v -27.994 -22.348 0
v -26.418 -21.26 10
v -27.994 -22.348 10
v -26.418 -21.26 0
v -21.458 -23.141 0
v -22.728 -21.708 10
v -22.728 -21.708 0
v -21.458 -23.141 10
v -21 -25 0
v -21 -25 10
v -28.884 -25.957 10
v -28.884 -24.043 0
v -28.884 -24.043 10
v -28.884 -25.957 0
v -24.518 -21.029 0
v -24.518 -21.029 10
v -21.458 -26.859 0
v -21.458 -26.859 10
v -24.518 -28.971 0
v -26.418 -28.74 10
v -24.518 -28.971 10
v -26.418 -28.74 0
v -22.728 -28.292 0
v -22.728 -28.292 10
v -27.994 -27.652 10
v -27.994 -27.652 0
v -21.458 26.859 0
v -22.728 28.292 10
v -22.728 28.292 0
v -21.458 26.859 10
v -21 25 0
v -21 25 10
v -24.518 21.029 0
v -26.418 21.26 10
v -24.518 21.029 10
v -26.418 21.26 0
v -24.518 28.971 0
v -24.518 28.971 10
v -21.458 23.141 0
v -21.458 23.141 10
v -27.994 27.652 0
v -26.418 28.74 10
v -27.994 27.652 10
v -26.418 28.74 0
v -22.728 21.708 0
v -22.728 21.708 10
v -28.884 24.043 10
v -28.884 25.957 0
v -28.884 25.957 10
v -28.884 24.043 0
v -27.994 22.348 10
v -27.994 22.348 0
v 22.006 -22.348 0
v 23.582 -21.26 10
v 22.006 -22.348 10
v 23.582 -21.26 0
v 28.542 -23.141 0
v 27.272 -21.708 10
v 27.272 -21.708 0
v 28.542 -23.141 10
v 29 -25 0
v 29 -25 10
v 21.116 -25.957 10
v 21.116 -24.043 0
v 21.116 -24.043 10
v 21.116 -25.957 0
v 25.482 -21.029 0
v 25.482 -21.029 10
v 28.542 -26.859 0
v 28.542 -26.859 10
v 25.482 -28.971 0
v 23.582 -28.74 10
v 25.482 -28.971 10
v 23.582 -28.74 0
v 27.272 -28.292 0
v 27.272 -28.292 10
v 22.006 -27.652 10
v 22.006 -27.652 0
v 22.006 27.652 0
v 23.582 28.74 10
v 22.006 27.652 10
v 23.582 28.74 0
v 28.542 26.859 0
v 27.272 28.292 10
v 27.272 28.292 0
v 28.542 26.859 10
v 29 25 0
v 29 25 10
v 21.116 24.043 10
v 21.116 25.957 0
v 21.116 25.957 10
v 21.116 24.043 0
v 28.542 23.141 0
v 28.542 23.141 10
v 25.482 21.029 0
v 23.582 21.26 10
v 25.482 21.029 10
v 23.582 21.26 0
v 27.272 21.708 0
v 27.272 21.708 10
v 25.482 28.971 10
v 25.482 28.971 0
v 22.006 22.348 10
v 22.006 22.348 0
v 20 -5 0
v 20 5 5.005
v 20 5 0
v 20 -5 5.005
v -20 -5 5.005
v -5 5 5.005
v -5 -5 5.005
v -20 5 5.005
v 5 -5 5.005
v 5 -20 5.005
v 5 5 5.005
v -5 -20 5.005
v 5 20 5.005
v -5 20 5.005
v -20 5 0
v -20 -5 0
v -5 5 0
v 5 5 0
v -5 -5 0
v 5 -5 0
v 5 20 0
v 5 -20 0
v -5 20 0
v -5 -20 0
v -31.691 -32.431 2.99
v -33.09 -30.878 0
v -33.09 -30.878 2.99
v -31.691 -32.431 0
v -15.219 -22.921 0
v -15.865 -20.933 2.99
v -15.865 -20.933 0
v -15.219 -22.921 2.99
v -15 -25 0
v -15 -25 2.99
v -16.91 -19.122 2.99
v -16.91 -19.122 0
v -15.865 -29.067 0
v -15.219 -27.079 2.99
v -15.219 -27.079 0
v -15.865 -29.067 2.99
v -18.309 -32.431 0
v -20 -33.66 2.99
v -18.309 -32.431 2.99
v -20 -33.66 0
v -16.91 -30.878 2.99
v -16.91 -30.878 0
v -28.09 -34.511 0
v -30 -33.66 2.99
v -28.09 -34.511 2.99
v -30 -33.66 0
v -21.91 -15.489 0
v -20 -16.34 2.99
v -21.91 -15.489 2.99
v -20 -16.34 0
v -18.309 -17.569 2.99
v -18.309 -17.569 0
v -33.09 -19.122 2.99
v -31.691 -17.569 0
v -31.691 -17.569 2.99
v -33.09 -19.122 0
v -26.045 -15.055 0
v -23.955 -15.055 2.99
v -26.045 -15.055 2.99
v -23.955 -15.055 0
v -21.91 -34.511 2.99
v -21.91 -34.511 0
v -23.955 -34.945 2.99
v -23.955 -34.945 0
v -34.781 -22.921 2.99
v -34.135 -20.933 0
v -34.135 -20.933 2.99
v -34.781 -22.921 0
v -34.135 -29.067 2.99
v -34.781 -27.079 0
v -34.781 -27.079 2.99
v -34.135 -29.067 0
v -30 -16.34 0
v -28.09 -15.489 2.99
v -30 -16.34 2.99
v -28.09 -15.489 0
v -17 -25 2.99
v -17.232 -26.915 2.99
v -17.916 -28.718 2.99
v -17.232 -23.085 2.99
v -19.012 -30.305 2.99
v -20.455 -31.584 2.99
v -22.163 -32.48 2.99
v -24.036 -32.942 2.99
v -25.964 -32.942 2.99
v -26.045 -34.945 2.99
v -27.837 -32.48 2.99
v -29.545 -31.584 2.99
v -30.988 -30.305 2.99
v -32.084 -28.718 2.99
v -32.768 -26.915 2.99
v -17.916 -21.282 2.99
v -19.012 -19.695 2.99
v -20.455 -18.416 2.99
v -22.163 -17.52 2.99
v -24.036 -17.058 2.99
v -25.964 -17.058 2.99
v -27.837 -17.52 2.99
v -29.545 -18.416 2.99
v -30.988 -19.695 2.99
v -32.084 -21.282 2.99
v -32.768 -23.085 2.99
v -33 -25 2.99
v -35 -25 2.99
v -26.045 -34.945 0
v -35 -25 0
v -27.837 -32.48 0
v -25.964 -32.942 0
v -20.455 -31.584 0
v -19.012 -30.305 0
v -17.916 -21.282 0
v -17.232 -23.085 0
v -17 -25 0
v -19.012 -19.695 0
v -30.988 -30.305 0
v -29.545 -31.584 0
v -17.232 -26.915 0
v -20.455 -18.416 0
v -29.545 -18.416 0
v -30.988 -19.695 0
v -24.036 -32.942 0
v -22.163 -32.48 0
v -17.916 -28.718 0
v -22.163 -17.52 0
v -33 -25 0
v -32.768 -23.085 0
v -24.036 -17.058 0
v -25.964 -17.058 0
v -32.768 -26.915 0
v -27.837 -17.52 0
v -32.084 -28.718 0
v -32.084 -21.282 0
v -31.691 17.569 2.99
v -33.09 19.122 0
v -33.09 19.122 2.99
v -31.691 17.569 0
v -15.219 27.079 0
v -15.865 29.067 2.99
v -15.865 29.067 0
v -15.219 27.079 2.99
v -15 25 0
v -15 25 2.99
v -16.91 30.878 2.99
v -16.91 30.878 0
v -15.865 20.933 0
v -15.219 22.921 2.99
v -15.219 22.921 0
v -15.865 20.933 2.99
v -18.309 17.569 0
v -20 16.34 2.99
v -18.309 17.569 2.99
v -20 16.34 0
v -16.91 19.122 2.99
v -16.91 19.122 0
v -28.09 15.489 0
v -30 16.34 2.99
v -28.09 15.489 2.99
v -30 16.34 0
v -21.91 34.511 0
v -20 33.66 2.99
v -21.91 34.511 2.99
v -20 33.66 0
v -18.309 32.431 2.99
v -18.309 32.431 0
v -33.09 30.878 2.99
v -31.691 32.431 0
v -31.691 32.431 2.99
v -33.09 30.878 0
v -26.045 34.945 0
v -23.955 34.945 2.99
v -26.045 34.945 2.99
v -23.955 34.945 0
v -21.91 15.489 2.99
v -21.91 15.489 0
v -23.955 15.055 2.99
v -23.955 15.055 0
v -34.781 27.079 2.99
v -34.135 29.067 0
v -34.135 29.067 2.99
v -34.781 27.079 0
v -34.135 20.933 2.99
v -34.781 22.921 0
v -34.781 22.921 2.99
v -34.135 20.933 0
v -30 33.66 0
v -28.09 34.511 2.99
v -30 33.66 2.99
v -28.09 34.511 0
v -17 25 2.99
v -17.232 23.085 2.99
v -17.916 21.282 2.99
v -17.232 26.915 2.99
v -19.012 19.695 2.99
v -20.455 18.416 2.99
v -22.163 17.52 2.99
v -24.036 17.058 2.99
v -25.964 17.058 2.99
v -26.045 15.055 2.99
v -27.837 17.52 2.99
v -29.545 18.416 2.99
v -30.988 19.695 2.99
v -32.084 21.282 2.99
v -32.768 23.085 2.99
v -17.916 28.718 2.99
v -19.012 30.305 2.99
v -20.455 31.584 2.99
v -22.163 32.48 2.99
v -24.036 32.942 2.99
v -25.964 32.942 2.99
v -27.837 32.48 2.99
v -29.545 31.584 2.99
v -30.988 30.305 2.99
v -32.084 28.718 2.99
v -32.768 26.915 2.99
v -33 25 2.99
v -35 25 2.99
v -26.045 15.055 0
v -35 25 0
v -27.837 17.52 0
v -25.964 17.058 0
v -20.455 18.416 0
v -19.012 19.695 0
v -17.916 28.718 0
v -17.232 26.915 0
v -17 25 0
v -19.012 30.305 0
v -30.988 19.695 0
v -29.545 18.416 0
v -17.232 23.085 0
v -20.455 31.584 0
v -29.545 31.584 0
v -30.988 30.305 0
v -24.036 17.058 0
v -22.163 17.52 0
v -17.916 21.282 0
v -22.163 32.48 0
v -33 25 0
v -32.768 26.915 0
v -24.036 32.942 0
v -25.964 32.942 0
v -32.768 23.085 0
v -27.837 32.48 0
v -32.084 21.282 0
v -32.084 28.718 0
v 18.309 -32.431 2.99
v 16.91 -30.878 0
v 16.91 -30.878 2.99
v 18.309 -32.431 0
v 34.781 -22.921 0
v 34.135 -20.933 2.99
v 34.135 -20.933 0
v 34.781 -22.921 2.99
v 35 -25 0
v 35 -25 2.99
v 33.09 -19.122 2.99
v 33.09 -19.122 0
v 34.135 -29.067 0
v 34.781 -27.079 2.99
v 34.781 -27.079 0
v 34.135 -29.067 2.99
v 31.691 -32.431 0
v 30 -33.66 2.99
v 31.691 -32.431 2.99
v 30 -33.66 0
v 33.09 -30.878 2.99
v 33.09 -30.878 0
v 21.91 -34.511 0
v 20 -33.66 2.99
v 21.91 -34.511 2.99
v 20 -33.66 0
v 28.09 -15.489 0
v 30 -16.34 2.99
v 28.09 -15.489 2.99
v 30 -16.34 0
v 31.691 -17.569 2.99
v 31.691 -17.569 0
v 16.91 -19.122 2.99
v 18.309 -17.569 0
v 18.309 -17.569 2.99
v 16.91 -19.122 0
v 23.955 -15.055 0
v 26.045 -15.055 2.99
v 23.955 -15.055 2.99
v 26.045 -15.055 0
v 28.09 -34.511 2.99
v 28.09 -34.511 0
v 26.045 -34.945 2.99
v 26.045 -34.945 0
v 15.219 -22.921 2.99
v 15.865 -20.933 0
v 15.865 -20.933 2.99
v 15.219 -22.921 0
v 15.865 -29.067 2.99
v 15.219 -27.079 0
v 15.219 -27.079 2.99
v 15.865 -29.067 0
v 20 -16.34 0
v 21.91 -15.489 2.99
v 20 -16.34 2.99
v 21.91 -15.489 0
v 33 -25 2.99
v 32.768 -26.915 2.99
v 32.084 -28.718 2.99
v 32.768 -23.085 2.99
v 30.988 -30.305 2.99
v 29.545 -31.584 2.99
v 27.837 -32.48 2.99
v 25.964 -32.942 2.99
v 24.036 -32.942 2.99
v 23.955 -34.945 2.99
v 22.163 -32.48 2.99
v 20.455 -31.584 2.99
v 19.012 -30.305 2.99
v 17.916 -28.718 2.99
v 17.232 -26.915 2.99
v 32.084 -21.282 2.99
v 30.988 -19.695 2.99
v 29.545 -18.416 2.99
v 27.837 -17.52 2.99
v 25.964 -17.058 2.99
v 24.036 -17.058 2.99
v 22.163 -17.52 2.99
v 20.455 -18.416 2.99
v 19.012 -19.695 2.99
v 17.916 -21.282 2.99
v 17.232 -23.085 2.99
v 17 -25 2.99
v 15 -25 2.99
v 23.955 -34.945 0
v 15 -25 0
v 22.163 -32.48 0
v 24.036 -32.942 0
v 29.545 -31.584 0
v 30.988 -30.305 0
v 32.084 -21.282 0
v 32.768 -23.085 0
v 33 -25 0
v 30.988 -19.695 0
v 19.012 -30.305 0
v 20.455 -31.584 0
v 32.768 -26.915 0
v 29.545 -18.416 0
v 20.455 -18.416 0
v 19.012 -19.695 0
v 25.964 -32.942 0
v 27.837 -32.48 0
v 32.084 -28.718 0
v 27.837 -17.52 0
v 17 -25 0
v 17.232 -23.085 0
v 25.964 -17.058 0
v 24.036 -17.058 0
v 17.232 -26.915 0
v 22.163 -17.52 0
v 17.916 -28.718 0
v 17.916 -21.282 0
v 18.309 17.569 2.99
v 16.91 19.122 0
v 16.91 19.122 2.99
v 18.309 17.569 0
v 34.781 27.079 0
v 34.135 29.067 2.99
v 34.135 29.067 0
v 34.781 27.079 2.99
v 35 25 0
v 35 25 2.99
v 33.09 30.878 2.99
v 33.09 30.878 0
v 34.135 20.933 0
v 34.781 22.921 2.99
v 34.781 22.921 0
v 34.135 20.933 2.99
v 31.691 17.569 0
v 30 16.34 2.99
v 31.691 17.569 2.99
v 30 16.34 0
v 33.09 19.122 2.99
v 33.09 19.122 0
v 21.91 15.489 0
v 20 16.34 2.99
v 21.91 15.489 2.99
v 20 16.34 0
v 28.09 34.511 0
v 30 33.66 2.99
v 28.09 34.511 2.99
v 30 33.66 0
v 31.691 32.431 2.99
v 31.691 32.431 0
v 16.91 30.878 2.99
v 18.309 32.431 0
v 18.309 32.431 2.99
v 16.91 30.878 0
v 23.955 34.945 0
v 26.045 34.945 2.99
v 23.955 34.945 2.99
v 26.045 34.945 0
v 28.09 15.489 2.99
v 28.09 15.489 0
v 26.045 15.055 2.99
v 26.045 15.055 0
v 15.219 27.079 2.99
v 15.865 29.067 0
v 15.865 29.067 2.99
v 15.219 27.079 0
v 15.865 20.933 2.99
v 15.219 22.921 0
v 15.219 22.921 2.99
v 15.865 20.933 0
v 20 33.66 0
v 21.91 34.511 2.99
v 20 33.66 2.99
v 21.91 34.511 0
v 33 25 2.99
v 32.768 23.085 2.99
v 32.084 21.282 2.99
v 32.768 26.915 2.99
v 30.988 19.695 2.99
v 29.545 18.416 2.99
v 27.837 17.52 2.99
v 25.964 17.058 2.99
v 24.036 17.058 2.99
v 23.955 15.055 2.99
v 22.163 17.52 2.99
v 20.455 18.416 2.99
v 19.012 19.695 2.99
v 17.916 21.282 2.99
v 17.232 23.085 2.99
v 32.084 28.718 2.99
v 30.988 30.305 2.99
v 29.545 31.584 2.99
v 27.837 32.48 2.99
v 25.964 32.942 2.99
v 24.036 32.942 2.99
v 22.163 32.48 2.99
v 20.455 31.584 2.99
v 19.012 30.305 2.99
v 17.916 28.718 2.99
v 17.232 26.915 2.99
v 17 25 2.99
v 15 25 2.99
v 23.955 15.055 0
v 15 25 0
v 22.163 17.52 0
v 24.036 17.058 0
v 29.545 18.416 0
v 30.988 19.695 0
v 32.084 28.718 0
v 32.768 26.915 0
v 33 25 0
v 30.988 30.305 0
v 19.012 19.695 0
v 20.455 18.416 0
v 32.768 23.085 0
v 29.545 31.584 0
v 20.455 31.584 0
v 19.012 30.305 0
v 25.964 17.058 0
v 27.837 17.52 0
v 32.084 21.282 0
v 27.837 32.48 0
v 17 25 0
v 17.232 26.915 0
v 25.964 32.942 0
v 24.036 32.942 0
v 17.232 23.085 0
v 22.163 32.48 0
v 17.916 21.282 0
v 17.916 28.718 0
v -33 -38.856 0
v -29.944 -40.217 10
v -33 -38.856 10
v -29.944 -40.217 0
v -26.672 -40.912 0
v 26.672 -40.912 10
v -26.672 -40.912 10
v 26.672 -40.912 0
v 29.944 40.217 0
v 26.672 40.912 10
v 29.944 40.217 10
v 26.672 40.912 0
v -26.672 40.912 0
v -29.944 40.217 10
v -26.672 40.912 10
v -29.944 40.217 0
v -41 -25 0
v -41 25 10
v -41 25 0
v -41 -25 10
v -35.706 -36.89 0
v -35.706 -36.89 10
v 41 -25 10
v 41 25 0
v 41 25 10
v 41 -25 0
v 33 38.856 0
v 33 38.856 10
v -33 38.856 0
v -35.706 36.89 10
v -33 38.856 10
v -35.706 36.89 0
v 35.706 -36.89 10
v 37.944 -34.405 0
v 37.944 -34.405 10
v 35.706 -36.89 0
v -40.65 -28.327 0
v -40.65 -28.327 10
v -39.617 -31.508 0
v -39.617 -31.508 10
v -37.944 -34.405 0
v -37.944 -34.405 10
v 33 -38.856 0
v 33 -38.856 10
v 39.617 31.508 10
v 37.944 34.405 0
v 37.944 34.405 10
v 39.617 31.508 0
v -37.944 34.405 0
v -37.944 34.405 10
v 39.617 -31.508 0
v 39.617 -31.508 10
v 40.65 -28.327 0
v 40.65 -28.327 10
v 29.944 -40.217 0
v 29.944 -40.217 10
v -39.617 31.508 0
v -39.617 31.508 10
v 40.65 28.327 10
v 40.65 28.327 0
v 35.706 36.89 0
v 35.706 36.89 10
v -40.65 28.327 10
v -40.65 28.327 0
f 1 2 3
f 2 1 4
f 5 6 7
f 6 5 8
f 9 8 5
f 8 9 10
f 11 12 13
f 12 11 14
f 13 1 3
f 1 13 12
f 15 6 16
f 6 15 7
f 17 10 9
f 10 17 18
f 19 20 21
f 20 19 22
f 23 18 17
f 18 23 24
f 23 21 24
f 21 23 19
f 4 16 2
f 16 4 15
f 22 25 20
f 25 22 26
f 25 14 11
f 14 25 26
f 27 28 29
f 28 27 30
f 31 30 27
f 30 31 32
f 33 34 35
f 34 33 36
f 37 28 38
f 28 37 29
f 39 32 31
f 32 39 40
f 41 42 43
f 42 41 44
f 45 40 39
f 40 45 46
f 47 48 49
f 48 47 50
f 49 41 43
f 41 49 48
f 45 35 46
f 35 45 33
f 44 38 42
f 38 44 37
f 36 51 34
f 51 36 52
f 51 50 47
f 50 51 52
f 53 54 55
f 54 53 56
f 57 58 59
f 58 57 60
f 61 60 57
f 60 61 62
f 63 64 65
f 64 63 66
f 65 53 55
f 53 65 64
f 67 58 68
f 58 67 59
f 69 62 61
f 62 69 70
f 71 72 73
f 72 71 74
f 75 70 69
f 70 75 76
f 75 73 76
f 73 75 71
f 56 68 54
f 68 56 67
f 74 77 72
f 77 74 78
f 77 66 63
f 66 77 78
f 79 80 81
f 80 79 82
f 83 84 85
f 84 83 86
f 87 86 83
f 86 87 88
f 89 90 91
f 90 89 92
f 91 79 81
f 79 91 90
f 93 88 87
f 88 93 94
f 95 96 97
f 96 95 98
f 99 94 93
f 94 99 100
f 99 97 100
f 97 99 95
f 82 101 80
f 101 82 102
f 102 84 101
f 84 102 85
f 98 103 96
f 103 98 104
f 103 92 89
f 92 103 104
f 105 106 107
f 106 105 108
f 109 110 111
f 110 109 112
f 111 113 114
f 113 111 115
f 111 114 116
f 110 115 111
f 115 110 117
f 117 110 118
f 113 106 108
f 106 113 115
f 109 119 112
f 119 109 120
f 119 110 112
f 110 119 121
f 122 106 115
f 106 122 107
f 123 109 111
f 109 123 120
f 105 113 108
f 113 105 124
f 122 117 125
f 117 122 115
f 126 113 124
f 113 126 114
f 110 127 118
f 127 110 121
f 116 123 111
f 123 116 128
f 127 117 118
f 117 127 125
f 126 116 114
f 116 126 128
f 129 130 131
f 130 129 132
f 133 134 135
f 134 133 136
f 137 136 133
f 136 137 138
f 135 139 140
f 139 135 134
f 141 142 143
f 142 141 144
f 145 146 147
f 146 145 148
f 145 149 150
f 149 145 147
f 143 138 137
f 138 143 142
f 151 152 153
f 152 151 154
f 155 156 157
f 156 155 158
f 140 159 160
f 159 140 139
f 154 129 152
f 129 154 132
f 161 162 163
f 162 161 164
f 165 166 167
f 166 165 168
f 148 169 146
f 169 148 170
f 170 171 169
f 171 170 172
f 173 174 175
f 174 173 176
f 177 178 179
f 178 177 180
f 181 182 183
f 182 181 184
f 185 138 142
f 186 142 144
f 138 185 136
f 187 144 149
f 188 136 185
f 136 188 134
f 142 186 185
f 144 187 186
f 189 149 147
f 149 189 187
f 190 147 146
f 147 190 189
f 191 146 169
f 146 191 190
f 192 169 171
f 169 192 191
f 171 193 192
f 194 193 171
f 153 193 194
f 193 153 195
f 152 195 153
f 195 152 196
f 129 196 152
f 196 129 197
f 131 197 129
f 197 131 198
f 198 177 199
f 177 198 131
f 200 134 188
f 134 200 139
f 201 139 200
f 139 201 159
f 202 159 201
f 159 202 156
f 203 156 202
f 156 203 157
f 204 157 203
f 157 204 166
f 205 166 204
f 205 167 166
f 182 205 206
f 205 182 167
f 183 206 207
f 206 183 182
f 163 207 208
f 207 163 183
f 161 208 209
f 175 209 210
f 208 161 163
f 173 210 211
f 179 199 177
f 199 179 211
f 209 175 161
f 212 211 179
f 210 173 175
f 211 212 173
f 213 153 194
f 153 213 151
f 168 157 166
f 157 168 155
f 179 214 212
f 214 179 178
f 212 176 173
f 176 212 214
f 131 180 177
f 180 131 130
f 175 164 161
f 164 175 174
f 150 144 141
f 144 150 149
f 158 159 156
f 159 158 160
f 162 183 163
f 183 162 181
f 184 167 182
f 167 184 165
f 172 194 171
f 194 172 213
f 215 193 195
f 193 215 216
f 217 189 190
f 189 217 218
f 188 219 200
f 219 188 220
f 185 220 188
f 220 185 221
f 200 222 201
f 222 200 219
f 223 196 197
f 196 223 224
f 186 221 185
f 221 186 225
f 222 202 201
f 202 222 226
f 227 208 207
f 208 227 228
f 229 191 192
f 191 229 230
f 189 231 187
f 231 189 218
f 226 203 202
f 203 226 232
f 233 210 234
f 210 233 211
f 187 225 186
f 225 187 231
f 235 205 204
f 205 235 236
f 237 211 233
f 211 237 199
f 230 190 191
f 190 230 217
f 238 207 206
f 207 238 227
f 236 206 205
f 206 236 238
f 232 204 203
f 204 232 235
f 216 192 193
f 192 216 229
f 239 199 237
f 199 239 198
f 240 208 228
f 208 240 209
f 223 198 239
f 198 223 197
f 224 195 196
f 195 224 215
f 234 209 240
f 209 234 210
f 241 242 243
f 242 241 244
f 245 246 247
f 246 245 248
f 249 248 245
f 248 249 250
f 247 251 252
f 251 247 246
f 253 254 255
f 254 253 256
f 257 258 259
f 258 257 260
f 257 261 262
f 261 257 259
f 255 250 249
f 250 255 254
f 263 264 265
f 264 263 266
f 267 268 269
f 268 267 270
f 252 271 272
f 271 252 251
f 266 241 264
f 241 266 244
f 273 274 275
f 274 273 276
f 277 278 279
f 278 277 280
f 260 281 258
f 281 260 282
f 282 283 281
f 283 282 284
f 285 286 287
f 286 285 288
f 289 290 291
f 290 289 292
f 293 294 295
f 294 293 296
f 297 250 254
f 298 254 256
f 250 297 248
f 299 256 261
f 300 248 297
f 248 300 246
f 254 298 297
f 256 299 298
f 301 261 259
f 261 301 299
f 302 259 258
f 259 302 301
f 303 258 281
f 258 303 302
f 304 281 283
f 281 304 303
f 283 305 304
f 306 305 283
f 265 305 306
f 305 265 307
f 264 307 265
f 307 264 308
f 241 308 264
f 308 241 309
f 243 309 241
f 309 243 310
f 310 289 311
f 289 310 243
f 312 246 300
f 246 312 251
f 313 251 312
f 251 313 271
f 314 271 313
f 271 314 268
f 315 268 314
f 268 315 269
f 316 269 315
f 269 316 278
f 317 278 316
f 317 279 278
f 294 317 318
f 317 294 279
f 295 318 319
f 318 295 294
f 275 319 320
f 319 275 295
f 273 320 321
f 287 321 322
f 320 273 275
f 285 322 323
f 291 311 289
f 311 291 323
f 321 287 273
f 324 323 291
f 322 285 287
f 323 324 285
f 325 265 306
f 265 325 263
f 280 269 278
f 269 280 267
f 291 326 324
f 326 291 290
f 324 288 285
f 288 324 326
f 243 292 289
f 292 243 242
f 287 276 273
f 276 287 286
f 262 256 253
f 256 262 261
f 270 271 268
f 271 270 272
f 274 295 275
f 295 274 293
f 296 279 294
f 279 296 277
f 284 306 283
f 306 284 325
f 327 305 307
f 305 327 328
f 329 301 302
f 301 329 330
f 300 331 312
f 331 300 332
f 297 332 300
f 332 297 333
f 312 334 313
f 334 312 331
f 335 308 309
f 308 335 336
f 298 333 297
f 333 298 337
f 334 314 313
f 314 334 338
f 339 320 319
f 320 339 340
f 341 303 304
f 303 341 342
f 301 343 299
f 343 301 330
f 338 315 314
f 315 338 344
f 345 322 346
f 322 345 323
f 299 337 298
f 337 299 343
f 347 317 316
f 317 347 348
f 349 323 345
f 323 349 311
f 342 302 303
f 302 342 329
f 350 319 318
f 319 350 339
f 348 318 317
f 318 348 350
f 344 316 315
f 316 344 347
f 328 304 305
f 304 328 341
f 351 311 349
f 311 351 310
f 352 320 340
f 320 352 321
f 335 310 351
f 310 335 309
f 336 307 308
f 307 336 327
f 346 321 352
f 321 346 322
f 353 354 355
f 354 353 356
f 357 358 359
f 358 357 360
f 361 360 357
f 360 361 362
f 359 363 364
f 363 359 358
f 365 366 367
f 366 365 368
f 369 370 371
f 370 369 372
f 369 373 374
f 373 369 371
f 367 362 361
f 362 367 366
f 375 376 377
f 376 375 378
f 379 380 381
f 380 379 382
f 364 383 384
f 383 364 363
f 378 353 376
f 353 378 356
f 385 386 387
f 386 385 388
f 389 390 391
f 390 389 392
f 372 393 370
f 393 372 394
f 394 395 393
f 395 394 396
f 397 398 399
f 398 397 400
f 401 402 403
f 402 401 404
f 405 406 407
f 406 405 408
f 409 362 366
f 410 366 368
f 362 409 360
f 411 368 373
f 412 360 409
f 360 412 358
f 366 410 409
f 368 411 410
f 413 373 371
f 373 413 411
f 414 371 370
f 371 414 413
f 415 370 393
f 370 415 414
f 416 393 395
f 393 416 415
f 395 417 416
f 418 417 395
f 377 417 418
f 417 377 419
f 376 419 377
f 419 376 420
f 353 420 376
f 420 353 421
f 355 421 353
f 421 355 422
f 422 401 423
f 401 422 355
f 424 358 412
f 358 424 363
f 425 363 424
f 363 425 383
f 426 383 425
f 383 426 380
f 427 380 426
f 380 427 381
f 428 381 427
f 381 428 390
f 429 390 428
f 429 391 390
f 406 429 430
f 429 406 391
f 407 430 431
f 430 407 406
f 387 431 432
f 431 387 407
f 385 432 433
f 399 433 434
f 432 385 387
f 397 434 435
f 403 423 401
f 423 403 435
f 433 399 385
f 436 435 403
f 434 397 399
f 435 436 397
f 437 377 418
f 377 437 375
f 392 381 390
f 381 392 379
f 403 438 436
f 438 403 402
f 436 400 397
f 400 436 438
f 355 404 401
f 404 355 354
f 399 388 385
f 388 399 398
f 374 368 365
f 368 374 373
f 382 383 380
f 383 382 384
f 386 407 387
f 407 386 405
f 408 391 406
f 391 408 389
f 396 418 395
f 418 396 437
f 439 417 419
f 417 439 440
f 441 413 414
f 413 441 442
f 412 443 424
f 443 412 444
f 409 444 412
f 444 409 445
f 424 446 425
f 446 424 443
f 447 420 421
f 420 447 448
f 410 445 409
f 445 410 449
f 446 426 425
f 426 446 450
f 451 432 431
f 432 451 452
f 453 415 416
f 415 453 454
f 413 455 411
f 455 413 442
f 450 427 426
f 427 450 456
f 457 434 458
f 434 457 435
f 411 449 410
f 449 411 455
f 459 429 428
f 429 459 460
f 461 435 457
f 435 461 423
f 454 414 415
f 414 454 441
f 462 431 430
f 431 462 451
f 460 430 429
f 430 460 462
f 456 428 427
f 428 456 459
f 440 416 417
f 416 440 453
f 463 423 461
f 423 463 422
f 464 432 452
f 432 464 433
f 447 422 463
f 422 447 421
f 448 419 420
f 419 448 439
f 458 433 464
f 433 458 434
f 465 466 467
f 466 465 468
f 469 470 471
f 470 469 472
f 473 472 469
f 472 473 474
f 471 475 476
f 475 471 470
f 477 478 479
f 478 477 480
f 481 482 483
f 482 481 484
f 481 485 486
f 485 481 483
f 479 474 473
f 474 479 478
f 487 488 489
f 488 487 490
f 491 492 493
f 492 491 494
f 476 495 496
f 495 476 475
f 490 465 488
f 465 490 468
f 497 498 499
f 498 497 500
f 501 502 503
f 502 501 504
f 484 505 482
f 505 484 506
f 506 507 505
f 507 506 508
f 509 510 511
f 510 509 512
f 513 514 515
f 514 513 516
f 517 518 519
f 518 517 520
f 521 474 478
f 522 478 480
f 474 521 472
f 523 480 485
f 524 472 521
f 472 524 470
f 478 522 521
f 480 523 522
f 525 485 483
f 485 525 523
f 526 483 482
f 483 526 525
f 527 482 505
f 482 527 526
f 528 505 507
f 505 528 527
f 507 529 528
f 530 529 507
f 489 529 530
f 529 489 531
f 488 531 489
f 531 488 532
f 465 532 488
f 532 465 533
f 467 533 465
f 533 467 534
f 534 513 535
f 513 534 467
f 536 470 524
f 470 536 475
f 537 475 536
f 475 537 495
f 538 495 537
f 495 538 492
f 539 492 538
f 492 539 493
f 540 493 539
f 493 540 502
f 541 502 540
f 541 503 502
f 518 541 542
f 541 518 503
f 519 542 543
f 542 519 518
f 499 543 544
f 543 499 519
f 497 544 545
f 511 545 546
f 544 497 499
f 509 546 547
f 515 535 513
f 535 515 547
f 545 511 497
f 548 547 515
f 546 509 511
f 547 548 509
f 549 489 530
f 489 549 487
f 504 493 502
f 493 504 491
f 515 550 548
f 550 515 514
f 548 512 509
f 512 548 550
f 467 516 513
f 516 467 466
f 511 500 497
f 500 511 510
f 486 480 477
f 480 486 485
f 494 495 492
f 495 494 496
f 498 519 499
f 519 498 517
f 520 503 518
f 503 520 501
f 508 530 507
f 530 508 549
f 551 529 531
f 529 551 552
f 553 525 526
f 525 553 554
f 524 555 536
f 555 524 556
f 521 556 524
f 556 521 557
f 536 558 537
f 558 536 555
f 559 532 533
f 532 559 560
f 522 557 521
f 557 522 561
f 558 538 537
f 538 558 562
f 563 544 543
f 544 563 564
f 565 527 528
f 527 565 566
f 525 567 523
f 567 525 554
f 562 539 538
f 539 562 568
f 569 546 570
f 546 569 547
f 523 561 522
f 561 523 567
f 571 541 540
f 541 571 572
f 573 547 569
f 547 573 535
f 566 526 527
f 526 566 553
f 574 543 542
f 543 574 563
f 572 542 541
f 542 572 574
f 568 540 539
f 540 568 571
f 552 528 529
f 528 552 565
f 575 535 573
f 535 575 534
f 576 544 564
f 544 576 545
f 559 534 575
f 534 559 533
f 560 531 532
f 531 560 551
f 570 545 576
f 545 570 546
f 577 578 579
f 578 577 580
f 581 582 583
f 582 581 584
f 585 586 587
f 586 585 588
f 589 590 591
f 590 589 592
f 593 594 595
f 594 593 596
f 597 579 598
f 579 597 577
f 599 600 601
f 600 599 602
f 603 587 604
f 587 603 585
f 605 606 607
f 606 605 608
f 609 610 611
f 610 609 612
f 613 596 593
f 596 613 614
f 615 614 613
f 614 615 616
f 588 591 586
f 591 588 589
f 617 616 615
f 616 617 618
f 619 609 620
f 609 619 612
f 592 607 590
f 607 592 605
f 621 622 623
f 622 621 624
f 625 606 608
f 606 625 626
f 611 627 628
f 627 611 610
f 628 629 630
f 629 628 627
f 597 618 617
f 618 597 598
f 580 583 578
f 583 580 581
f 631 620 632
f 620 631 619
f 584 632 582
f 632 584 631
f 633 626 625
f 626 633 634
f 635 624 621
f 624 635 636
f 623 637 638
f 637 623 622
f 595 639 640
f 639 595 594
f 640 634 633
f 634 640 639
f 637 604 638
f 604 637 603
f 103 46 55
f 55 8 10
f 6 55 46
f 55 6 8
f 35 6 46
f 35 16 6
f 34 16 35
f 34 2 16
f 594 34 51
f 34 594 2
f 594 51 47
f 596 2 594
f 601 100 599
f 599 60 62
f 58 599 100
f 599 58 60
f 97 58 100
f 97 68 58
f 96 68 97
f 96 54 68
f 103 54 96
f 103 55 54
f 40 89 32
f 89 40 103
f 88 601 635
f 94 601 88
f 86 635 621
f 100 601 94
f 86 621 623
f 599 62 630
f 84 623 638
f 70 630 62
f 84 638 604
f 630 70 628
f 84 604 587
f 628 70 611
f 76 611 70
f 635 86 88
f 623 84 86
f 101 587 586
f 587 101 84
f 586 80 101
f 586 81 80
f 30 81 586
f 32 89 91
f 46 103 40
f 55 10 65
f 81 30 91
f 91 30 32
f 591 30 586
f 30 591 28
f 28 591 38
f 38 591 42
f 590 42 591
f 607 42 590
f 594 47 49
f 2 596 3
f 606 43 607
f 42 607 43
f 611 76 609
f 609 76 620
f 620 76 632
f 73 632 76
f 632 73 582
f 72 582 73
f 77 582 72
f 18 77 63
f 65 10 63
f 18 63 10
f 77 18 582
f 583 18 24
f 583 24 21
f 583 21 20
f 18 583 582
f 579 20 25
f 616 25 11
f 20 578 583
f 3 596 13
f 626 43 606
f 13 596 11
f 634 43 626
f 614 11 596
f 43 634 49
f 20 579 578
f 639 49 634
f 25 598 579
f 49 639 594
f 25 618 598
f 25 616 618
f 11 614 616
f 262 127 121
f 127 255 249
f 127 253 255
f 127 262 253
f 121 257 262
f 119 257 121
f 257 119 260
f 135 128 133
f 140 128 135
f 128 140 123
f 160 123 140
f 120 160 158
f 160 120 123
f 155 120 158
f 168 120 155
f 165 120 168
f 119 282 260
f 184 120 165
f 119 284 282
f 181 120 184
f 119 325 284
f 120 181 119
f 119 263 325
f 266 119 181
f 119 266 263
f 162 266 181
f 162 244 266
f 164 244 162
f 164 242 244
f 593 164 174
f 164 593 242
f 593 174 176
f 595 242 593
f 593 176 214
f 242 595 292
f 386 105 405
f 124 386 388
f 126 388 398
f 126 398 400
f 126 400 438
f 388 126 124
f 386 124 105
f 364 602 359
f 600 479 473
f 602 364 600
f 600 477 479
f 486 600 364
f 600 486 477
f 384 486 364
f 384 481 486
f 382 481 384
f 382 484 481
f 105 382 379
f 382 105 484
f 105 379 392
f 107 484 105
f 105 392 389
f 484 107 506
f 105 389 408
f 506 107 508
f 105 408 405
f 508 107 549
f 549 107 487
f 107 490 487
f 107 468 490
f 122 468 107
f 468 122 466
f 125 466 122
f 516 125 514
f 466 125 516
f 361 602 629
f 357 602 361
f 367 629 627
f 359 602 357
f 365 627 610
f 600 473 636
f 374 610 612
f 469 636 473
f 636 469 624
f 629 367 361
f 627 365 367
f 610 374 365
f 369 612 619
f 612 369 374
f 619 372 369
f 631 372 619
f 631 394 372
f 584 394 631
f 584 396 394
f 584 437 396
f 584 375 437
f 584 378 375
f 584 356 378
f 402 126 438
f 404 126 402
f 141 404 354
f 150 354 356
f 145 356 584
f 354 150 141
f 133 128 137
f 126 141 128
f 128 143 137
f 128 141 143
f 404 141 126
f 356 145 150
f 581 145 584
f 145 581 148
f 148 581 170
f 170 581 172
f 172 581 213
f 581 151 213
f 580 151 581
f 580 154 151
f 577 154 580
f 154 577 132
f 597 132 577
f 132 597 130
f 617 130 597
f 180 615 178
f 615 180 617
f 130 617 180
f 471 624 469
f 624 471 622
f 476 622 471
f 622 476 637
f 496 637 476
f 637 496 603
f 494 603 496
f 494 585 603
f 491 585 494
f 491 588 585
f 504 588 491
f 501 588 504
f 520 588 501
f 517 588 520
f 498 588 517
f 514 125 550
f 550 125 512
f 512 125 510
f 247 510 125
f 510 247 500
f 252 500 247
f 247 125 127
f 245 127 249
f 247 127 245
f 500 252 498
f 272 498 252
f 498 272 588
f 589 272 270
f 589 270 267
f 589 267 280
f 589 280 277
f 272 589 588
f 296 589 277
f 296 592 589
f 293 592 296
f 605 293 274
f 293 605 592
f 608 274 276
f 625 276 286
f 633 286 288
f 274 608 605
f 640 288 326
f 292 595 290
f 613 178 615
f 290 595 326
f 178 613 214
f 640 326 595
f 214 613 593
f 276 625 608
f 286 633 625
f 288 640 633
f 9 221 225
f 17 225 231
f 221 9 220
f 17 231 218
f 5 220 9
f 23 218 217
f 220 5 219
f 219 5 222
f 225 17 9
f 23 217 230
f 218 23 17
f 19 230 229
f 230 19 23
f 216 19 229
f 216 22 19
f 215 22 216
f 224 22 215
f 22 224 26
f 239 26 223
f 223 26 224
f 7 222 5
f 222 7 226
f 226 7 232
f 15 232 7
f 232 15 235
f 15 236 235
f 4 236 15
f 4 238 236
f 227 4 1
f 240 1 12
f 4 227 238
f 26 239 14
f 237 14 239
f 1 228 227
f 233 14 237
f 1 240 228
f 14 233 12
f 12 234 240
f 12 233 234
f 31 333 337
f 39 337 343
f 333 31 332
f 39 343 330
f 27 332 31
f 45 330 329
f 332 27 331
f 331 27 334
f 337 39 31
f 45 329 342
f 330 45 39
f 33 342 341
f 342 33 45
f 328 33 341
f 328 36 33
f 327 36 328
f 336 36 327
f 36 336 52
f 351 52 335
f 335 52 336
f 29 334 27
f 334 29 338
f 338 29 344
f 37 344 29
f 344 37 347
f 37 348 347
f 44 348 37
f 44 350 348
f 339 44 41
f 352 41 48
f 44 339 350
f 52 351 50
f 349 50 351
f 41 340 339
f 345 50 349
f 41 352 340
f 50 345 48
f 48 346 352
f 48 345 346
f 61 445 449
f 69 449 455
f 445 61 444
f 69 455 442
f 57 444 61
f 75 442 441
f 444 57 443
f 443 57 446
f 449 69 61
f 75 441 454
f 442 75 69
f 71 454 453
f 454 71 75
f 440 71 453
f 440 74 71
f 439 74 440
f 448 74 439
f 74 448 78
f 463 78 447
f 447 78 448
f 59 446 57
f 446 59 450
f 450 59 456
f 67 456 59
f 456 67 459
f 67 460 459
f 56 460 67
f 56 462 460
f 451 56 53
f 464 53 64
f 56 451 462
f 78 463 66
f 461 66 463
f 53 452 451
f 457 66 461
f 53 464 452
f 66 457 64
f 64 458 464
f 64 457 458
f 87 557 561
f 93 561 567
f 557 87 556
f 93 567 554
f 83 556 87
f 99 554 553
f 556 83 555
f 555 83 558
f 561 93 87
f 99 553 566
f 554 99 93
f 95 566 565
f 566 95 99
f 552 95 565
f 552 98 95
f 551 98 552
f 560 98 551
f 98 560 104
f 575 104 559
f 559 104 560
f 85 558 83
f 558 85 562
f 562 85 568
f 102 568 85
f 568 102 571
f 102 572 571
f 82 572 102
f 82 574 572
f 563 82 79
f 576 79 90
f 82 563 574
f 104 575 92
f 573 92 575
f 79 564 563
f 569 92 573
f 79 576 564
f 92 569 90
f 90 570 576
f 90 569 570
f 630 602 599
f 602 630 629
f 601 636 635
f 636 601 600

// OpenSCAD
/*
  Inteded workflow is to export all required OpenSCAD objects (meshes)
  as individual geometries, as below.
*/

/*cura-export 'baseplate()' AS Baseplate */
/*cura-export 'reinforcment(d = 14)' AS Reinforcment100 */
/*cura-export 'reinforcment(d = 24)' AS Reinforcment50*/
/*cura-export 'support()' AS Support */

/*
  This will place four objects on the build plate. After defining
  'Per Model Settings' for each of them, use 'Select All Models',
  'Reset All Model Positions' and 'Group Models' to transform them
  into a single part.

  (not implemented yet) Printing or saving the generated GCode will
  cause Cura to write all changes back to the OpenSCAD file like below.
  The difference ist here is that this is only a single Part made from
  four meshes with specific settings per mesh.
*/

/* cura-export
    'baseplate()' AS Baseplate SETTINGS
        infill_sparse_density = 25
    'reinforcment(d = 14)' AS Reinforcment100 SETTINGS
        infill_mesh = True,
        infill_sparse_density = 100
    'reinforcment(d = 24)' AS Reinforcment50 SETTINGS
        infill_mesh = True,
        infill_sparse_density = 50
    'support()' AS Support SETTINGS
        support_mesh = True
*/

module relief(ri = 10, ro = 12, h = 3) {
   difference() {
       cylinder(r = ro, h = h);
       translate([0, 0, -0.01]) cylinder(r = ri, h = h + 0.02);
   }    
}

module centers(x, y, z = 0) {
   for(tx = [-x/2, x/2], ty = [-y/2, y/2])
       translate([tx, ty, z]) children();
}

module reinforcment(x = 50, y = 50, d = 8, h = 10) {
  centers(x, y) cylinder(r = d/2, h = h); 
}

module support(x = 50, y = 50) {
   translate([0, 0, 2.5]) {
     cube([x - 10, 10, 5.01], center = true);
     cube([10, y - 10, 5.01], center = true);
   }
}

module nosupport(x = 50, y = 50, d = 8) {
   centers(x, y, -0.01) relief(ri = d/2 + 4, ro = d/2 + 6);
}

module baseplate(x = 50, y = 50, d = 8, h = 10) {
   difference() {
       hull() centers(x, y) cylinder(r = 2 * d, h = h);
       centers(x, y, -0.01) cylinder(r = d/2, h = h + 0.02);
       support(x, y, d);
       nosupport(x, y);
   }
}

baseplate();
%color([0.5, 0, 0, 0.75]) reinforcment(d = 14, h = 10.2);
%color([0.5, 0.25, 0.25, 0.75]) reinforcment(d = 24, h = 10.1);
%color([0.75, 0.75, 1.0, 0.5]) support();
